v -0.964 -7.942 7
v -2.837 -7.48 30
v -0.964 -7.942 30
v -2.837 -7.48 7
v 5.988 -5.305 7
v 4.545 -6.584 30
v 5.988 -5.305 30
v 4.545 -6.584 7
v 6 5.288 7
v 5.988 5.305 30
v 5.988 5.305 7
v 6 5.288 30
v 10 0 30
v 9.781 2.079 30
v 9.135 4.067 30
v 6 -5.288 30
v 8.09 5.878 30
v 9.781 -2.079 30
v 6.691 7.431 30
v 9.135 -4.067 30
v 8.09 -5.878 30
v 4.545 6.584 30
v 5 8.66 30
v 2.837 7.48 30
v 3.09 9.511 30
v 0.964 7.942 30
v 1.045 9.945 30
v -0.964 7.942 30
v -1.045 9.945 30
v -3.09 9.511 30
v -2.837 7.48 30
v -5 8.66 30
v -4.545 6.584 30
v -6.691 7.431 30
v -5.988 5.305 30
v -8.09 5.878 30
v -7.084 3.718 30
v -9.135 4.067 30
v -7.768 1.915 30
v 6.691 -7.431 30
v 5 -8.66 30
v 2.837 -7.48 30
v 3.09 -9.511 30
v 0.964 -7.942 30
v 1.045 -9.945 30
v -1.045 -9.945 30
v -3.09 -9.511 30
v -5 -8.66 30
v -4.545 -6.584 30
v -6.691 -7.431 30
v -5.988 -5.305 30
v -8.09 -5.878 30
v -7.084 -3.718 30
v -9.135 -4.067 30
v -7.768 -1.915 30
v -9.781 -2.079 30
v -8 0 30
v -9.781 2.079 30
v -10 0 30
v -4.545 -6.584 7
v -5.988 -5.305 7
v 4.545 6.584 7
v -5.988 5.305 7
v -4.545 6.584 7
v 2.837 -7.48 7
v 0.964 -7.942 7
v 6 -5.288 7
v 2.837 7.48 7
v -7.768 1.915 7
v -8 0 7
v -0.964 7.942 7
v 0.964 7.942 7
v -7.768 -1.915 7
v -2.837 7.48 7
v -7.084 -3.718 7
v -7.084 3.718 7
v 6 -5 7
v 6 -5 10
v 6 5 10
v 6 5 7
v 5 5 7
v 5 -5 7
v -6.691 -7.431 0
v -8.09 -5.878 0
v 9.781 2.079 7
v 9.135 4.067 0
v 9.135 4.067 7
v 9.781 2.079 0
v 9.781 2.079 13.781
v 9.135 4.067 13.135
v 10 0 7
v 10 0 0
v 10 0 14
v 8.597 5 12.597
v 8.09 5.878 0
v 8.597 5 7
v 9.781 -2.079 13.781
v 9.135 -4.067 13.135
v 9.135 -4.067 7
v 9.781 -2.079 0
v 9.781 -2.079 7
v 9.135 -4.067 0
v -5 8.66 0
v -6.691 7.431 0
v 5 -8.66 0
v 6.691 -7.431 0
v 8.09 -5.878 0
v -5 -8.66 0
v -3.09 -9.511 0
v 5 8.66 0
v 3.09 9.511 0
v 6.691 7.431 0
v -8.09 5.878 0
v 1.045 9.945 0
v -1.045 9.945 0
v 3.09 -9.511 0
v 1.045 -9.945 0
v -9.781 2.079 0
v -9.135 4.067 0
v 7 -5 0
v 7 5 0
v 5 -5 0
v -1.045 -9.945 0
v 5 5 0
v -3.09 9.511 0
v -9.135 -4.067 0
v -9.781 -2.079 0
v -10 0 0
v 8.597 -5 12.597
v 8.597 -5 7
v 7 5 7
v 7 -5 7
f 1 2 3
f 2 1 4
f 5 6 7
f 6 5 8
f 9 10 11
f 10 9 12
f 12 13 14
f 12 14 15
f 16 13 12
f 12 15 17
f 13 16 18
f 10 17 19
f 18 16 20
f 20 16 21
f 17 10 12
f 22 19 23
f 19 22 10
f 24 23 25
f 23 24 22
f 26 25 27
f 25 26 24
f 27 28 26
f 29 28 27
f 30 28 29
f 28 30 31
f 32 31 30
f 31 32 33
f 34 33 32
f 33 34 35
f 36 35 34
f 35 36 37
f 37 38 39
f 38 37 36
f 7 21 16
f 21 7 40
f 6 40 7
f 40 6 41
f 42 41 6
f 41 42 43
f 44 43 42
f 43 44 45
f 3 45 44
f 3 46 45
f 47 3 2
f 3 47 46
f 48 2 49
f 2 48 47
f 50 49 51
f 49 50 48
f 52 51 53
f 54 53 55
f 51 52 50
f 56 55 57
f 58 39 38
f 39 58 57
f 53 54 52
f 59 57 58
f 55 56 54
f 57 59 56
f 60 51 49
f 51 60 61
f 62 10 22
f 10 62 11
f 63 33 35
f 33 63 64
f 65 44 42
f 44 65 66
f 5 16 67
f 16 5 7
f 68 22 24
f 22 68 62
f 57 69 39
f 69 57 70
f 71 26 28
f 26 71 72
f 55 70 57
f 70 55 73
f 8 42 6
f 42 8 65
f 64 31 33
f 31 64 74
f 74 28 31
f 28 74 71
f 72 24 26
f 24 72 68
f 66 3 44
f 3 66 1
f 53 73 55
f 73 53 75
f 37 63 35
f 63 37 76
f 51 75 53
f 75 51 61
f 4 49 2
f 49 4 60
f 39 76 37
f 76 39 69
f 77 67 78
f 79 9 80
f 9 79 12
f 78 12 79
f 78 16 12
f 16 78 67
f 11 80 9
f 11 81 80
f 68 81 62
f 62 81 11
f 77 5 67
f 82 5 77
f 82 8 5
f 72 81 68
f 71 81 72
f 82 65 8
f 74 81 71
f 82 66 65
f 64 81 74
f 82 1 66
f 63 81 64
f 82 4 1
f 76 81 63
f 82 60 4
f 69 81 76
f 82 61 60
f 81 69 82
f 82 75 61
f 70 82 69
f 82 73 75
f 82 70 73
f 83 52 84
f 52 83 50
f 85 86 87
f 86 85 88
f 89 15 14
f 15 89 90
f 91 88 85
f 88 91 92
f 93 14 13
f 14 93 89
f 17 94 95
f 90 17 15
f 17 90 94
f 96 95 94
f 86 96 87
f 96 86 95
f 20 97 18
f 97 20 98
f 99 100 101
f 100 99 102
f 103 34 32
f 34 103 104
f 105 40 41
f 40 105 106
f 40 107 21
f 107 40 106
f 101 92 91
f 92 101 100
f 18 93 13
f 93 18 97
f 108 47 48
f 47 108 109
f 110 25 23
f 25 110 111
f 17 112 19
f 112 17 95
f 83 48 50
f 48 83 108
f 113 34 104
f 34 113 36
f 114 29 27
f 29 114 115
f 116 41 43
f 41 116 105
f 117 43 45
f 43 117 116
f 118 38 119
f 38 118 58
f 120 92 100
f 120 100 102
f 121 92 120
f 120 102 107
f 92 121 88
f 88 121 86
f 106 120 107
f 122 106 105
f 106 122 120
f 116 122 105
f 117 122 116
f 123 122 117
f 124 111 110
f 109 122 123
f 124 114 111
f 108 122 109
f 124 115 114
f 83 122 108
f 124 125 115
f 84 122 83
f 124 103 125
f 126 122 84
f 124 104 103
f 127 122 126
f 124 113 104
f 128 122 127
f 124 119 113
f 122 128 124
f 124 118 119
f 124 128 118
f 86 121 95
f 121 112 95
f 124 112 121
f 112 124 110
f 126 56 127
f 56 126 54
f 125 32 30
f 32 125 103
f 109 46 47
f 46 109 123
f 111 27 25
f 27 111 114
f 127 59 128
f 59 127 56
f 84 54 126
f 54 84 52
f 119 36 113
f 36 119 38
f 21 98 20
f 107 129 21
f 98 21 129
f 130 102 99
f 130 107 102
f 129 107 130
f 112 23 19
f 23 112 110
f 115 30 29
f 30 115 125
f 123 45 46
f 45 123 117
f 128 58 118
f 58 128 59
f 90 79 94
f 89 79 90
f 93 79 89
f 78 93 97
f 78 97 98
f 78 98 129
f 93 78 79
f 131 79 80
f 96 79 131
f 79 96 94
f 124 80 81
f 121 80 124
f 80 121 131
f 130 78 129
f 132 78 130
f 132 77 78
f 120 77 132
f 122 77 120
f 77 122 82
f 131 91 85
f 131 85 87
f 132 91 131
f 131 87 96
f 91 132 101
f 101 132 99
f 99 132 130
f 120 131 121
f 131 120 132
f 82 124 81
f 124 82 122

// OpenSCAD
/*
parametric fipple practice.  many interdependencies.

- block/windway should be made separate part
- max lip length (at 15°) should be limit of this section 
- need coupler fitting
- fitting could extend into window at its maximum depth
- need architecture for interdependencies and geometry helpers
*/
module pipe(inner,outer){
    difference() {
        cylinder(r=outer,h=30);
        difference() {
            cylinder(r=inner,h=30);
            // lip extension
            translate([6,-6,0]) cube([2,13,30]);
            // block
            cylinder(r=outer,h=7);
        }
    }
}


module lip() {
    translate([0,-5,0])
    difference() {
        rotate([0, 45, 0])
        cube([10,10,10]);
        translate([0,0,-10])
        cube([15,10,10]);
        translate([5*sqrt(2),0,0])
        cube([10,10,10]);    
    }
}

difference(){
    pipe(8,10);
    translate([6,0,10]) lip();
    // window
    translate([6,-5,7]) cube([10,10,3]);
    // windway (bottom cut from block)
    translate([5,-5,0]) cube([2,10,10]);    
}
